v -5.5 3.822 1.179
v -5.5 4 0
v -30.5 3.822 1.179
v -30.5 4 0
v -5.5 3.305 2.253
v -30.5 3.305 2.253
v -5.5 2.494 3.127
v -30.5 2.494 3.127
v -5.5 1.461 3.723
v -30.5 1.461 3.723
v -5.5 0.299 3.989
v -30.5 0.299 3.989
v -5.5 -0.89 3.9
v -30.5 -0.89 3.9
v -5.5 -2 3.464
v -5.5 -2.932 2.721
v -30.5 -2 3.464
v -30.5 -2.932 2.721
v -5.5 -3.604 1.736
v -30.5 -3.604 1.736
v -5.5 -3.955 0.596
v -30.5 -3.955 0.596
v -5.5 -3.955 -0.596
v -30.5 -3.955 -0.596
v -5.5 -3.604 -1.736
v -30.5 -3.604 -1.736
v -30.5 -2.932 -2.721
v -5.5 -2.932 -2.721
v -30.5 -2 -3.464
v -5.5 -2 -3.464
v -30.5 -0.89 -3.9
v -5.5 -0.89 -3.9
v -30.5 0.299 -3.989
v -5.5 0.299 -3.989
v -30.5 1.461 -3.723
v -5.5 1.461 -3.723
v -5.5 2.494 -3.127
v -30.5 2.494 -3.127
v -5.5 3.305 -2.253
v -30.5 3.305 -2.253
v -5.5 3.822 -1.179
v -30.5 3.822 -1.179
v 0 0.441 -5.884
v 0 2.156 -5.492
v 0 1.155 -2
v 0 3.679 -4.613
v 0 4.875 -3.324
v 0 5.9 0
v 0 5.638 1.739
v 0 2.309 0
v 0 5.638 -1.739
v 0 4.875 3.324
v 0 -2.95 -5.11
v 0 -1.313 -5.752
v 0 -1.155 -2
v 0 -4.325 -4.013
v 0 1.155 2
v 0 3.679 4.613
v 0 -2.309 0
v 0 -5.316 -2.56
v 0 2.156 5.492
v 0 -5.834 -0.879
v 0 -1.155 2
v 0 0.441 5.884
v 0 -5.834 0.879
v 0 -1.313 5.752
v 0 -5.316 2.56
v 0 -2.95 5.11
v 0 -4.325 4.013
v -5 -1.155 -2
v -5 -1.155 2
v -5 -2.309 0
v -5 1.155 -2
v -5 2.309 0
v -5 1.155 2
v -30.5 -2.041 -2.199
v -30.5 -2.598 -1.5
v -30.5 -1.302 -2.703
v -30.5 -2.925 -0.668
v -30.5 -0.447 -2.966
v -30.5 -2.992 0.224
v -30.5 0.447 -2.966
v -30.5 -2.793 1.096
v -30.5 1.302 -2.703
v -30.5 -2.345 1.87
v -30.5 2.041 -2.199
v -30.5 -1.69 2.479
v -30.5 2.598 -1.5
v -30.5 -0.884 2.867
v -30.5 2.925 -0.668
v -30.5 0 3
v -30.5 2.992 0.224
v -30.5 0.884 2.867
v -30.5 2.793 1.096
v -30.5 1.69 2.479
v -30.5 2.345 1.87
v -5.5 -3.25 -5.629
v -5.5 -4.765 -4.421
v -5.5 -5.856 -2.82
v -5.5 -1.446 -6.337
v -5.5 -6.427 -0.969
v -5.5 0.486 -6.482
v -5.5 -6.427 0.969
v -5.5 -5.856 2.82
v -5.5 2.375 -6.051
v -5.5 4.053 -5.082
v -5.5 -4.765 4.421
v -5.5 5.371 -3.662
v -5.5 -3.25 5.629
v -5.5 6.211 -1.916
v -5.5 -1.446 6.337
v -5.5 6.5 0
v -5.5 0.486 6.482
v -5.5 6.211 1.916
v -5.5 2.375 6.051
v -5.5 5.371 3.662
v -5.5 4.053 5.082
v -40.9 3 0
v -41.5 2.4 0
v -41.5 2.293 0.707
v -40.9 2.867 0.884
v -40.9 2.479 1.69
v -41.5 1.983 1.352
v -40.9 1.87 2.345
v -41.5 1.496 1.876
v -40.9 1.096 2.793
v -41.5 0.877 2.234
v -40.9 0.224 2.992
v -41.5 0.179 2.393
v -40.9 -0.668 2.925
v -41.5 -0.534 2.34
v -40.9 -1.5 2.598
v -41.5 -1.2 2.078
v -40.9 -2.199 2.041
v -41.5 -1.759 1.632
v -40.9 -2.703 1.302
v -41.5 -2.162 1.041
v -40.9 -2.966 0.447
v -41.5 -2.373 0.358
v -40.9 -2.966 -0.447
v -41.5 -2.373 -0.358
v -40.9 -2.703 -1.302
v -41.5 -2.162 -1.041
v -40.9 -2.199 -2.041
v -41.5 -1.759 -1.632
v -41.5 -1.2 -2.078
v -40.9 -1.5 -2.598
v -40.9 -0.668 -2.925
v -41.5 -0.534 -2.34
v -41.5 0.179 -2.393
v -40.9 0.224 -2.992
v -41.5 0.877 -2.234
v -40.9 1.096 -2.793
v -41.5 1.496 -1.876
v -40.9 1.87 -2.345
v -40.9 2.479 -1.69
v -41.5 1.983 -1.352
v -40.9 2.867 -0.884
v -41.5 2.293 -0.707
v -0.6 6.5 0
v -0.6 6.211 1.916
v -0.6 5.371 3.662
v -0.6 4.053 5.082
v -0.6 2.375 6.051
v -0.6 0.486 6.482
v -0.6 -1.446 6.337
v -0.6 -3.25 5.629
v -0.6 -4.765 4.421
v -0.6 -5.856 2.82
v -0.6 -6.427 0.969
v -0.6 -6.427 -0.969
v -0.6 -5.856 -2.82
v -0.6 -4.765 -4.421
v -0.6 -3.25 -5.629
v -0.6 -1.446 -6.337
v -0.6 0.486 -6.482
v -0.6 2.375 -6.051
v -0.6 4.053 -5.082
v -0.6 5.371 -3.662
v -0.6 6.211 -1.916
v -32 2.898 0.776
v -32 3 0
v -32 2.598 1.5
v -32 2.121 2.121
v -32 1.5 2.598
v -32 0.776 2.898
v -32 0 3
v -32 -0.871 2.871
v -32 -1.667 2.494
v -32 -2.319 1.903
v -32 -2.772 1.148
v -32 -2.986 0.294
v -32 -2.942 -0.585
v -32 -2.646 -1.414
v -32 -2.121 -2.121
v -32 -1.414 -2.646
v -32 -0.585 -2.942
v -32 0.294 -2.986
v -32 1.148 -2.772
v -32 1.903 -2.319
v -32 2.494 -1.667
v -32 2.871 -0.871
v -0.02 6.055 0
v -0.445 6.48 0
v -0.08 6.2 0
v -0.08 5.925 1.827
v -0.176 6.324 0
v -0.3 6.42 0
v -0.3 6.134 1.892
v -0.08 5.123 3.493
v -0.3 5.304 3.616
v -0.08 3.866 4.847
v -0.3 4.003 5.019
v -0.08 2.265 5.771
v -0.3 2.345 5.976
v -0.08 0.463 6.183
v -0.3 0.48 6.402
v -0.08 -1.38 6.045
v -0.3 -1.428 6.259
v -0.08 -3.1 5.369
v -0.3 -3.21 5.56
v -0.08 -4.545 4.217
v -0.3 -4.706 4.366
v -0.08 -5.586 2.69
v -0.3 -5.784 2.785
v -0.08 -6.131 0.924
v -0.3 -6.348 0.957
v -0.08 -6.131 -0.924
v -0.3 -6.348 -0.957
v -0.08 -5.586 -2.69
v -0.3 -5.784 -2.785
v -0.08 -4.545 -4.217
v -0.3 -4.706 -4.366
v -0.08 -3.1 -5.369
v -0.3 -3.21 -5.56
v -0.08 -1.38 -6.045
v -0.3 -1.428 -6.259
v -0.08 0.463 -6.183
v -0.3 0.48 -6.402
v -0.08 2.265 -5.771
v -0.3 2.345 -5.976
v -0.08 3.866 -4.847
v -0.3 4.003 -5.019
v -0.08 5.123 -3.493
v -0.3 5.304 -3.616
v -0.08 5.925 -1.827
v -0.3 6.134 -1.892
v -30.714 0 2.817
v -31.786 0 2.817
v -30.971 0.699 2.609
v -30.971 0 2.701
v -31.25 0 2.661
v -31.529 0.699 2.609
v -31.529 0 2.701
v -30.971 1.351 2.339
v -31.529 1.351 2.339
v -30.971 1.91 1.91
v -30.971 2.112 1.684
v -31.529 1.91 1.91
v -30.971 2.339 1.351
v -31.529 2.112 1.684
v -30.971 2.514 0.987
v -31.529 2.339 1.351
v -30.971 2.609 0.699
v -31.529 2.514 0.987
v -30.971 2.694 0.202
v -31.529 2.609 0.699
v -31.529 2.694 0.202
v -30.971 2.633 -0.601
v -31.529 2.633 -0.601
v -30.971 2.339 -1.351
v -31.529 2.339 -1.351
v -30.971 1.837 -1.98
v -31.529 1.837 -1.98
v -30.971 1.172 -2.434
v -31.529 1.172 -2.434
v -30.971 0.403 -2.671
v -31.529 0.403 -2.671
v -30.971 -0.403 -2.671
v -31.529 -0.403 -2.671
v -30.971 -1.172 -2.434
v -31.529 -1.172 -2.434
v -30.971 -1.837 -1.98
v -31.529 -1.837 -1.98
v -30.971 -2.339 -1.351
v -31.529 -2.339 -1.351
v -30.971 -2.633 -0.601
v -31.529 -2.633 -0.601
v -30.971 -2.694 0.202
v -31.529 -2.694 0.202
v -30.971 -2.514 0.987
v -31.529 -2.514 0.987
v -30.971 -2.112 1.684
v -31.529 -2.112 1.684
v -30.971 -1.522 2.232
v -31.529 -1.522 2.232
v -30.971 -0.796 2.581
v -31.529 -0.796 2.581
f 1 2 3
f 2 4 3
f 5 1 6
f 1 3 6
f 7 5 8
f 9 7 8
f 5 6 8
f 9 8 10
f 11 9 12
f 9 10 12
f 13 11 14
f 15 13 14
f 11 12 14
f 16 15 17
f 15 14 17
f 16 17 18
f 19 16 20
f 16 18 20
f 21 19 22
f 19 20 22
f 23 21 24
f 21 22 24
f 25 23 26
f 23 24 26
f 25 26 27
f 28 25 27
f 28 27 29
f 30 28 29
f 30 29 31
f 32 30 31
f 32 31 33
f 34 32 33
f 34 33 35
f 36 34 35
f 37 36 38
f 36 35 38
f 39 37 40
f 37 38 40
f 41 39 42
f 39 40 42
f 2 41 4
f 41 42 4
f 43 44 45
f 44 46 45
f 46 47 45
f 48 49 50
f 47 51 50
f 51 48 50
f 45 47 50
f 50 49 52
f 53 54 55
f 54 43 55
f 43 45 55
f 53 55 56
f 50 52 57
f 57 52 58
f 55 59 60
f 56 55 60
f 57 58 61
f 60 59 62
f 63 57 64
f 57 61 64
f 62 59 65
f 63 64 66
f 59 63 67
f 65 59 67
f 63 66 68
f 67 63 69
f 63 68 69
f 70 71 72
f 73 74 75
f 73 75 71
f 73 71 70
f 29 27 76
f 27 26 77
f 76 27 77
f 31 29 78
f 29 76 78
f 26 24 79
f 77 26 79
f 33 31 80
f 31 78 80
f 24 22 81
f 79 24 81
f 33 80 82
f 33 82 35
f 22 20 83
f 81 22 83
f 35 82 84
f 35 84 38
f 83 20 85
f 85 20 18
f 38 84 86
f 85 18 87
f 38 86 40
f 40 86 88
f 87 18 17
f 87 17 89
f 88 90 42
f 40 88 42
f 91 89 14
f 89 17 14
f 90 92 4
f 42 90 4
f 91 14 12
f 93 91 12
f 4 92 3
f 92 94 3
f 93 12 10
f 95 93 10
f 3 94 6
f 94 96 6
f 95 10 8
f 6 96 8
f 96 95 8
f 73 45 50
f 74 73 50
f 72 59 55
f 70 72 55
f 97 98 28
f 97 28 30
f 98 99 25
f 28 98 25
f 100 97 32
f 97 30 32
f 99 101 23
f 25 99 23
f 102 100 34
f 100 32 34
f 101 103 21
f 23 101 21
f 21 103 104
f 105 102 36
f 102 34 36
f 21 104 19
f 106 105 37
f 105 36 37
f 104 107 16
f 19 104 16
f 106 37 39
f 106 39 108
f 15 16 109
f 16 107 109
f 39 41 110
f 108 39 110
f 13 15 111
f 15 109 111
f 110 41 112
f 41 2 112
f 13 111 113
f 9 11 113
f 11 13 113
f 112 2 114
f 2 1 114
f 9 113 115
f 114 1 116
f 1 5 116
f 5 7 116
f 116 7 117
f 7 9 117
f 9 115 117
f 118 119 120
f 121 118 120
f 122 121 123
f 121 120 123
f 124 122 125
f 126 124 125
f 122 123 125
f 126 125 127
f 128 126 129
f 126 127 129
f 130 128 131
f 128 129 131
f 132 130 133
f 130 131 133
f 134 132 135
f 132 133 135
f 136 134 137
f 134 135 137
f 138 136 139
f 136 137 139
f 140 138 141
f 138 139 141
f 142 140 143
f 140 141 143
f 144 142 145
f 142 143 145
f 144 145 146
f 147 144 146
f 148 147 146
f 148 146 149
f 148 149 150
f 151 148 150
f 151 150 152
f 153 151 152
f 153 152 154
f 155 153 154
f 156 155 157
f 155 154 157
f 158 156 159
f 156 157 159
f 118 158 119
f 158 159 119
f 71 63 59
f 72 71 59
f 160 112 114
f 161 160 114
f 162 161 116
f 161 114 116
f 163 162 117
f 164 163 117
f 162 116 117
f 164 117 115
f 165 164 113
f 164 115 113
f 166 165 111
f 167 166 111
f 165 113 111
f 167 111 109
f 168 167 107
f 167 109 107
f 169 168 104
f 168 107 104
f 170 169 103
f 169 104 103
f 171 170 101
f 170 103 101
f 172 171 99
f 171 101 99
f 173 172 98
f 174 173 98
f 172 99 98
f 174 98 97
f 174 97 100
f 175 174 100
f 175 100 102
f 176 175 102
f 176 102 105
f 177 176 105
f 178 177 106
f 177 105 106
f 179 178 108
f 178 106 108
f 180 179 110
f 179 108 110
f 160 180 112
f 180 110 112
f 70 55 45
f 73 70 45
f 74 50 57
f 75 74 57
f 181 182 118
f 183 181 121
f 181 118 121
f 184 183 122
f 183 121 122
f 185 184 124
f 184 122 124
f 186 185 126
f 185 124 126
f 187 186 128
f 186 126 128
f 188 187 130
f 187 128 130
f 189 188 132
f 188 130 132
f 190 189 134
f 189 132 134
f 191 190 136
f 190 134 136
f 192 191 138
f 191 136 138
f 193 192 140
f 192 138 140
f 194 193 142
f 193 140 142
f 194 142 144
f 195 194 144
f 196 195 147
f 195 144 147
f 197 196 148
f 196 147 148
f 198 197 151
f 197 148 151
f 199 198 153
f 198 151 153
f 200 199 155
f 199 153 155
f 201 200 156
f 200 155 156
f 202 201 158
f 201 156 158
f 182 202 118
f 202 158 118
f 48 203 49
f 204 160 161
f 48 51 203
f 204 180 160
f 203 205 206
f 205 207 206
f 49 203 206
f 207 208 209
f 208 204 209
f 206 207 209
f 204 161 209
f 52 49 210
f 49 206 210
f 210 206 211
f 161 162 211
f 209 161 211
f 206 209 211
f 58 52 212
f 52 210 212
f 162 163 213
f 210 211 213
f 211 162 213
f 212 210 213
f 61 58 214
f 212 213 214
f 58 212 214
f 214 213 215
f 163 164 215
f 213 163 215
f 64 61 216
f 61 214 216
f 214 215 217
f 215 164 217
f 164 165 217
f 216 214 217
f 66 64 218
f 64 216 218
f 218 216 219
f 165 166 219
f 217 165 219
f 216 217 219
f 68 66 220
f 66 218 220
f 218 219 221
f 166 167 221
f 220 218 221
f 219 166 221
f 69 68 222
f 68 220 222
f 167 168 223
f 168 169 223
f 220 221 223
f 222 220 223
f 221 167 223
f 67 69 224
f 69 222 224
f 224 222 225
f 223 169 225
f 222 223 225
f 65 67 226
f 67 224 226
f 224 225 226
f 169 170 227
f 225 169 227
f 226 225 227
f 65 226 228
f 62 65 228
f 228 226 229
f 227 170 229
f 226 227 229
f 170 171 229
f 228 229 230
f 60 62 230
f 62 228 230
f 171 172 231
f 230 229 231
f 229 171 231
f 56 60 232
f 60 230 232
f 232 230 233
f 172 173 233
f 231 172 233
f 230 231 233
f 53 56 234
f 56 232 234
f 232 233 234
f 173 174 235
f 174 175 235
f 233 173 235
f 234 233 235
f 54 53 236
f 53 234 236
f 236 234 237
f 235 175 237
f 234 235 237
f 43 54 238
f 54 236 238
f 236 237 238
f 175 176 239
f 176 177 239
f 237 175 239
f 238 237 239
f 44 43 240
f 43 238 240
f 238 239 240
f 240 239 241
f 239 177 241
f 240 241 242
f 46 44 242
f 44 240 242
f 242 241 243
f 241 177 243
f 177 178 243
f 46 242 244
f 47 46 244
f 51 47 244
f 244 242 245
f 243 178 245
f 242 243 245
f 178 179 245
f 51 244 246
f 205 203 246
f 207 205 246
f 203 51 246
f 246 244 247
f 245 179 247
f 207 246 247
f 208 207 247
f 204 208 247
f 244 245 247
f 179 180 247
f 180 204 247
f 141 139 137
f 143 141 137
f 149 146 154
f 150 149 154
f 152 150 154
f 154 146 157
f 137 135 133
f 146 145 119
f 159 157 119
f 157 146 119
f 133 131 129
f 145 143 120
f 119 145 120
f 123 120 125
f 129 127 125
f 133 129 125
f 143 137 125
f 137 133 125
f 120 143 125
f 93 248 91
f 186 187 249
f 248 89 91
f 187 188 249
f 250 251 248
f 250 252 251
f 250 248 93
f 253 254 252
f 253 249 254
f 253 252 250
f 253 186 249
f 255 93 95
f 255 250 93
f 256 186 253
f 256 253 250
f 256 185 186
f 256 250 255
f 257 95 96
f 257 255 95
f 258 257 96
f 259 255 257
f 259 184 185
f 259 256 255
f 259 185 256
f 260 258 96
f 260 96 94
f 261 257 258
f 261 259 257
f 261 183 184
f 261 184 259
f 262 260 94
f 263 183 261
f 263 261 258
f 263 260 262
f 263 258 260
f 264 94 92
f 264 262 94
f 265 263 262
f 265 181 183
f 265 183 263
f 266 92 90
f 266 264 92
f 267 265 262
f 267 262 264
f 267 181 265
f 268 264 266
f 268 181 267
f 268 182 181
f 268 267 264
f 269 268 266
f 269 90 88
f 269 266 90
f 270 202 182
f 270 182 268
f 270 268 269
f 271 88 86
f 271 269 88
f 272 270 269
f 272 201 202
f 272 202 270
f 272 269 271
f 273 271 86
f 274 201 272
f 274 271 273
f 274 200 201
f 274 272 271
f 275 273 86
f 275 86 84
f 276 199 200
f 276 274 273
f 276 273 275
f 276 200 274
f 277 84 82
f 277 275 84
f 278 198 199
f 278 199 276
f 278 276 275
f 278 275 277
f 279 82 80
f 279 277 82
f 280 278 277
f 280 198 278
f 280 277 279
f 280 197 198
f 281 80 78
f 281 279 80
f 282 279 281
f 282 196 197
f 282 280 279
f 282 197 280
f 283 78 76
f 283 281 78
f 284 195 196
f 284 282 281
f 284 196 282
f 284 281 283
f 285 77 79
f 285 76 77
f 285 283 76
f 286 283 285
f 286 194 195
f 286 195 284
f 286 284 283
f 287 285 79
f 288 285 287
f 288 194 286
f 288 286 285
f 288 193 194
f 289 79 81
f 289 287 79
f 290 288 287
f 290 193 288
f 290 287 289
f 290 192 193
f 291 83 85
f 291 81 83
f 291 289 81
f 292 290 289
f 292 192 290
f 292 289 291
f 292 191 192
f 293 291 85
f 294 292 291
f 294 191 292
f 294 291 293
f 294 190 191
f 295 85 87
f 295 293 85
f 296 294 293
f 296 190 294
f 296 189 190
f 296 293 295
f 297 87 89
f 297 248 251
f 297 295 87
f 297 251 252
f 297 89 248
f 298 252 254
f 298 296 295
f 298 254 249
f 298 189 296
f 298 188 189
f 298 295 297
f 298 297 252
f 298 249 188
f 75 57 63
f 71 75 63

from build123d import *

# Parameters (mm, degrees)
ZAOKR_GLENIE1_R            = 0.6
SFAZOWANIE1_SIZE           = 0.6
WYTNIJ_WYCI_GNI_CIE1_DEPTH = 5


with BuildPart() as part:
    # ruba parametryczna → Obrót1 (revolve)
    with BuildSketch(Plane.XY):
        Polygon((0, 0), (0, 6.5), (-5.5, 6.5), (-5.5, 4), (-30.5, 4), (-30.5, 3), (-41.5, 3), (-41.5, 0), align=None)
    revolve(axis=Axis((0, 0, 0), (1, 0, 0)))

    # Zaokrąglenie1
    zaokr_glenie1_edges = [part.edges().sort_by_distance(p)[0] for p in [
        (0, -6.5, 0),
    ]]
    fillet(zaokr_glenie1_edges, radius=ZAOKR_GLENIE1_R)

    # Sfazowanie1
    sfazowanie1_edges = [part.edges().sort_by_distance(p)[0] for p in [
        (-41.5, -3, 0),
    ]]
    chamfer(sfazowanie1_edges, length=SFAZOWANIE1_SIZE)

    # Szkic2 → Wytnij-wyciągnięcie1 (cut)
    with BuildSketch(Plane(origin=(0, 0, 0), x_dir=(0, 0, -1), z_dir=(1, 0, 0))):
        Polygon((-2, -1.154700538), (0, -2.309401077), (2, -1.154700538), (2, 1.154700538), (0, 2.309401077), (-2, 1.154700538), align=None)
    extrude(amount=-WYTNIJ_WYCI_GNI_CIE1_DEPTH, mode=Mode.SUBTRACT)

    # Szkic3 → Wycięcie-obrót1 (revolve, cut)
    with BuildSketch(Plane(origin=(0, 0, 0), x_dir=(1, 0, 0), z_dir=(0, 1, 0))):
        with BuildLine():
            Line((-32, -3), (-30.5, -3))
            ThreePointArc((-30.5, -3), (-31.25, -2.661437828), (-32, -3))
        make_face()
    revolve(axis=Axis((3.805158027, 0, 0), (-1, 0, 0)), mode=Mode.SUBTRACT)


solid = part.part
